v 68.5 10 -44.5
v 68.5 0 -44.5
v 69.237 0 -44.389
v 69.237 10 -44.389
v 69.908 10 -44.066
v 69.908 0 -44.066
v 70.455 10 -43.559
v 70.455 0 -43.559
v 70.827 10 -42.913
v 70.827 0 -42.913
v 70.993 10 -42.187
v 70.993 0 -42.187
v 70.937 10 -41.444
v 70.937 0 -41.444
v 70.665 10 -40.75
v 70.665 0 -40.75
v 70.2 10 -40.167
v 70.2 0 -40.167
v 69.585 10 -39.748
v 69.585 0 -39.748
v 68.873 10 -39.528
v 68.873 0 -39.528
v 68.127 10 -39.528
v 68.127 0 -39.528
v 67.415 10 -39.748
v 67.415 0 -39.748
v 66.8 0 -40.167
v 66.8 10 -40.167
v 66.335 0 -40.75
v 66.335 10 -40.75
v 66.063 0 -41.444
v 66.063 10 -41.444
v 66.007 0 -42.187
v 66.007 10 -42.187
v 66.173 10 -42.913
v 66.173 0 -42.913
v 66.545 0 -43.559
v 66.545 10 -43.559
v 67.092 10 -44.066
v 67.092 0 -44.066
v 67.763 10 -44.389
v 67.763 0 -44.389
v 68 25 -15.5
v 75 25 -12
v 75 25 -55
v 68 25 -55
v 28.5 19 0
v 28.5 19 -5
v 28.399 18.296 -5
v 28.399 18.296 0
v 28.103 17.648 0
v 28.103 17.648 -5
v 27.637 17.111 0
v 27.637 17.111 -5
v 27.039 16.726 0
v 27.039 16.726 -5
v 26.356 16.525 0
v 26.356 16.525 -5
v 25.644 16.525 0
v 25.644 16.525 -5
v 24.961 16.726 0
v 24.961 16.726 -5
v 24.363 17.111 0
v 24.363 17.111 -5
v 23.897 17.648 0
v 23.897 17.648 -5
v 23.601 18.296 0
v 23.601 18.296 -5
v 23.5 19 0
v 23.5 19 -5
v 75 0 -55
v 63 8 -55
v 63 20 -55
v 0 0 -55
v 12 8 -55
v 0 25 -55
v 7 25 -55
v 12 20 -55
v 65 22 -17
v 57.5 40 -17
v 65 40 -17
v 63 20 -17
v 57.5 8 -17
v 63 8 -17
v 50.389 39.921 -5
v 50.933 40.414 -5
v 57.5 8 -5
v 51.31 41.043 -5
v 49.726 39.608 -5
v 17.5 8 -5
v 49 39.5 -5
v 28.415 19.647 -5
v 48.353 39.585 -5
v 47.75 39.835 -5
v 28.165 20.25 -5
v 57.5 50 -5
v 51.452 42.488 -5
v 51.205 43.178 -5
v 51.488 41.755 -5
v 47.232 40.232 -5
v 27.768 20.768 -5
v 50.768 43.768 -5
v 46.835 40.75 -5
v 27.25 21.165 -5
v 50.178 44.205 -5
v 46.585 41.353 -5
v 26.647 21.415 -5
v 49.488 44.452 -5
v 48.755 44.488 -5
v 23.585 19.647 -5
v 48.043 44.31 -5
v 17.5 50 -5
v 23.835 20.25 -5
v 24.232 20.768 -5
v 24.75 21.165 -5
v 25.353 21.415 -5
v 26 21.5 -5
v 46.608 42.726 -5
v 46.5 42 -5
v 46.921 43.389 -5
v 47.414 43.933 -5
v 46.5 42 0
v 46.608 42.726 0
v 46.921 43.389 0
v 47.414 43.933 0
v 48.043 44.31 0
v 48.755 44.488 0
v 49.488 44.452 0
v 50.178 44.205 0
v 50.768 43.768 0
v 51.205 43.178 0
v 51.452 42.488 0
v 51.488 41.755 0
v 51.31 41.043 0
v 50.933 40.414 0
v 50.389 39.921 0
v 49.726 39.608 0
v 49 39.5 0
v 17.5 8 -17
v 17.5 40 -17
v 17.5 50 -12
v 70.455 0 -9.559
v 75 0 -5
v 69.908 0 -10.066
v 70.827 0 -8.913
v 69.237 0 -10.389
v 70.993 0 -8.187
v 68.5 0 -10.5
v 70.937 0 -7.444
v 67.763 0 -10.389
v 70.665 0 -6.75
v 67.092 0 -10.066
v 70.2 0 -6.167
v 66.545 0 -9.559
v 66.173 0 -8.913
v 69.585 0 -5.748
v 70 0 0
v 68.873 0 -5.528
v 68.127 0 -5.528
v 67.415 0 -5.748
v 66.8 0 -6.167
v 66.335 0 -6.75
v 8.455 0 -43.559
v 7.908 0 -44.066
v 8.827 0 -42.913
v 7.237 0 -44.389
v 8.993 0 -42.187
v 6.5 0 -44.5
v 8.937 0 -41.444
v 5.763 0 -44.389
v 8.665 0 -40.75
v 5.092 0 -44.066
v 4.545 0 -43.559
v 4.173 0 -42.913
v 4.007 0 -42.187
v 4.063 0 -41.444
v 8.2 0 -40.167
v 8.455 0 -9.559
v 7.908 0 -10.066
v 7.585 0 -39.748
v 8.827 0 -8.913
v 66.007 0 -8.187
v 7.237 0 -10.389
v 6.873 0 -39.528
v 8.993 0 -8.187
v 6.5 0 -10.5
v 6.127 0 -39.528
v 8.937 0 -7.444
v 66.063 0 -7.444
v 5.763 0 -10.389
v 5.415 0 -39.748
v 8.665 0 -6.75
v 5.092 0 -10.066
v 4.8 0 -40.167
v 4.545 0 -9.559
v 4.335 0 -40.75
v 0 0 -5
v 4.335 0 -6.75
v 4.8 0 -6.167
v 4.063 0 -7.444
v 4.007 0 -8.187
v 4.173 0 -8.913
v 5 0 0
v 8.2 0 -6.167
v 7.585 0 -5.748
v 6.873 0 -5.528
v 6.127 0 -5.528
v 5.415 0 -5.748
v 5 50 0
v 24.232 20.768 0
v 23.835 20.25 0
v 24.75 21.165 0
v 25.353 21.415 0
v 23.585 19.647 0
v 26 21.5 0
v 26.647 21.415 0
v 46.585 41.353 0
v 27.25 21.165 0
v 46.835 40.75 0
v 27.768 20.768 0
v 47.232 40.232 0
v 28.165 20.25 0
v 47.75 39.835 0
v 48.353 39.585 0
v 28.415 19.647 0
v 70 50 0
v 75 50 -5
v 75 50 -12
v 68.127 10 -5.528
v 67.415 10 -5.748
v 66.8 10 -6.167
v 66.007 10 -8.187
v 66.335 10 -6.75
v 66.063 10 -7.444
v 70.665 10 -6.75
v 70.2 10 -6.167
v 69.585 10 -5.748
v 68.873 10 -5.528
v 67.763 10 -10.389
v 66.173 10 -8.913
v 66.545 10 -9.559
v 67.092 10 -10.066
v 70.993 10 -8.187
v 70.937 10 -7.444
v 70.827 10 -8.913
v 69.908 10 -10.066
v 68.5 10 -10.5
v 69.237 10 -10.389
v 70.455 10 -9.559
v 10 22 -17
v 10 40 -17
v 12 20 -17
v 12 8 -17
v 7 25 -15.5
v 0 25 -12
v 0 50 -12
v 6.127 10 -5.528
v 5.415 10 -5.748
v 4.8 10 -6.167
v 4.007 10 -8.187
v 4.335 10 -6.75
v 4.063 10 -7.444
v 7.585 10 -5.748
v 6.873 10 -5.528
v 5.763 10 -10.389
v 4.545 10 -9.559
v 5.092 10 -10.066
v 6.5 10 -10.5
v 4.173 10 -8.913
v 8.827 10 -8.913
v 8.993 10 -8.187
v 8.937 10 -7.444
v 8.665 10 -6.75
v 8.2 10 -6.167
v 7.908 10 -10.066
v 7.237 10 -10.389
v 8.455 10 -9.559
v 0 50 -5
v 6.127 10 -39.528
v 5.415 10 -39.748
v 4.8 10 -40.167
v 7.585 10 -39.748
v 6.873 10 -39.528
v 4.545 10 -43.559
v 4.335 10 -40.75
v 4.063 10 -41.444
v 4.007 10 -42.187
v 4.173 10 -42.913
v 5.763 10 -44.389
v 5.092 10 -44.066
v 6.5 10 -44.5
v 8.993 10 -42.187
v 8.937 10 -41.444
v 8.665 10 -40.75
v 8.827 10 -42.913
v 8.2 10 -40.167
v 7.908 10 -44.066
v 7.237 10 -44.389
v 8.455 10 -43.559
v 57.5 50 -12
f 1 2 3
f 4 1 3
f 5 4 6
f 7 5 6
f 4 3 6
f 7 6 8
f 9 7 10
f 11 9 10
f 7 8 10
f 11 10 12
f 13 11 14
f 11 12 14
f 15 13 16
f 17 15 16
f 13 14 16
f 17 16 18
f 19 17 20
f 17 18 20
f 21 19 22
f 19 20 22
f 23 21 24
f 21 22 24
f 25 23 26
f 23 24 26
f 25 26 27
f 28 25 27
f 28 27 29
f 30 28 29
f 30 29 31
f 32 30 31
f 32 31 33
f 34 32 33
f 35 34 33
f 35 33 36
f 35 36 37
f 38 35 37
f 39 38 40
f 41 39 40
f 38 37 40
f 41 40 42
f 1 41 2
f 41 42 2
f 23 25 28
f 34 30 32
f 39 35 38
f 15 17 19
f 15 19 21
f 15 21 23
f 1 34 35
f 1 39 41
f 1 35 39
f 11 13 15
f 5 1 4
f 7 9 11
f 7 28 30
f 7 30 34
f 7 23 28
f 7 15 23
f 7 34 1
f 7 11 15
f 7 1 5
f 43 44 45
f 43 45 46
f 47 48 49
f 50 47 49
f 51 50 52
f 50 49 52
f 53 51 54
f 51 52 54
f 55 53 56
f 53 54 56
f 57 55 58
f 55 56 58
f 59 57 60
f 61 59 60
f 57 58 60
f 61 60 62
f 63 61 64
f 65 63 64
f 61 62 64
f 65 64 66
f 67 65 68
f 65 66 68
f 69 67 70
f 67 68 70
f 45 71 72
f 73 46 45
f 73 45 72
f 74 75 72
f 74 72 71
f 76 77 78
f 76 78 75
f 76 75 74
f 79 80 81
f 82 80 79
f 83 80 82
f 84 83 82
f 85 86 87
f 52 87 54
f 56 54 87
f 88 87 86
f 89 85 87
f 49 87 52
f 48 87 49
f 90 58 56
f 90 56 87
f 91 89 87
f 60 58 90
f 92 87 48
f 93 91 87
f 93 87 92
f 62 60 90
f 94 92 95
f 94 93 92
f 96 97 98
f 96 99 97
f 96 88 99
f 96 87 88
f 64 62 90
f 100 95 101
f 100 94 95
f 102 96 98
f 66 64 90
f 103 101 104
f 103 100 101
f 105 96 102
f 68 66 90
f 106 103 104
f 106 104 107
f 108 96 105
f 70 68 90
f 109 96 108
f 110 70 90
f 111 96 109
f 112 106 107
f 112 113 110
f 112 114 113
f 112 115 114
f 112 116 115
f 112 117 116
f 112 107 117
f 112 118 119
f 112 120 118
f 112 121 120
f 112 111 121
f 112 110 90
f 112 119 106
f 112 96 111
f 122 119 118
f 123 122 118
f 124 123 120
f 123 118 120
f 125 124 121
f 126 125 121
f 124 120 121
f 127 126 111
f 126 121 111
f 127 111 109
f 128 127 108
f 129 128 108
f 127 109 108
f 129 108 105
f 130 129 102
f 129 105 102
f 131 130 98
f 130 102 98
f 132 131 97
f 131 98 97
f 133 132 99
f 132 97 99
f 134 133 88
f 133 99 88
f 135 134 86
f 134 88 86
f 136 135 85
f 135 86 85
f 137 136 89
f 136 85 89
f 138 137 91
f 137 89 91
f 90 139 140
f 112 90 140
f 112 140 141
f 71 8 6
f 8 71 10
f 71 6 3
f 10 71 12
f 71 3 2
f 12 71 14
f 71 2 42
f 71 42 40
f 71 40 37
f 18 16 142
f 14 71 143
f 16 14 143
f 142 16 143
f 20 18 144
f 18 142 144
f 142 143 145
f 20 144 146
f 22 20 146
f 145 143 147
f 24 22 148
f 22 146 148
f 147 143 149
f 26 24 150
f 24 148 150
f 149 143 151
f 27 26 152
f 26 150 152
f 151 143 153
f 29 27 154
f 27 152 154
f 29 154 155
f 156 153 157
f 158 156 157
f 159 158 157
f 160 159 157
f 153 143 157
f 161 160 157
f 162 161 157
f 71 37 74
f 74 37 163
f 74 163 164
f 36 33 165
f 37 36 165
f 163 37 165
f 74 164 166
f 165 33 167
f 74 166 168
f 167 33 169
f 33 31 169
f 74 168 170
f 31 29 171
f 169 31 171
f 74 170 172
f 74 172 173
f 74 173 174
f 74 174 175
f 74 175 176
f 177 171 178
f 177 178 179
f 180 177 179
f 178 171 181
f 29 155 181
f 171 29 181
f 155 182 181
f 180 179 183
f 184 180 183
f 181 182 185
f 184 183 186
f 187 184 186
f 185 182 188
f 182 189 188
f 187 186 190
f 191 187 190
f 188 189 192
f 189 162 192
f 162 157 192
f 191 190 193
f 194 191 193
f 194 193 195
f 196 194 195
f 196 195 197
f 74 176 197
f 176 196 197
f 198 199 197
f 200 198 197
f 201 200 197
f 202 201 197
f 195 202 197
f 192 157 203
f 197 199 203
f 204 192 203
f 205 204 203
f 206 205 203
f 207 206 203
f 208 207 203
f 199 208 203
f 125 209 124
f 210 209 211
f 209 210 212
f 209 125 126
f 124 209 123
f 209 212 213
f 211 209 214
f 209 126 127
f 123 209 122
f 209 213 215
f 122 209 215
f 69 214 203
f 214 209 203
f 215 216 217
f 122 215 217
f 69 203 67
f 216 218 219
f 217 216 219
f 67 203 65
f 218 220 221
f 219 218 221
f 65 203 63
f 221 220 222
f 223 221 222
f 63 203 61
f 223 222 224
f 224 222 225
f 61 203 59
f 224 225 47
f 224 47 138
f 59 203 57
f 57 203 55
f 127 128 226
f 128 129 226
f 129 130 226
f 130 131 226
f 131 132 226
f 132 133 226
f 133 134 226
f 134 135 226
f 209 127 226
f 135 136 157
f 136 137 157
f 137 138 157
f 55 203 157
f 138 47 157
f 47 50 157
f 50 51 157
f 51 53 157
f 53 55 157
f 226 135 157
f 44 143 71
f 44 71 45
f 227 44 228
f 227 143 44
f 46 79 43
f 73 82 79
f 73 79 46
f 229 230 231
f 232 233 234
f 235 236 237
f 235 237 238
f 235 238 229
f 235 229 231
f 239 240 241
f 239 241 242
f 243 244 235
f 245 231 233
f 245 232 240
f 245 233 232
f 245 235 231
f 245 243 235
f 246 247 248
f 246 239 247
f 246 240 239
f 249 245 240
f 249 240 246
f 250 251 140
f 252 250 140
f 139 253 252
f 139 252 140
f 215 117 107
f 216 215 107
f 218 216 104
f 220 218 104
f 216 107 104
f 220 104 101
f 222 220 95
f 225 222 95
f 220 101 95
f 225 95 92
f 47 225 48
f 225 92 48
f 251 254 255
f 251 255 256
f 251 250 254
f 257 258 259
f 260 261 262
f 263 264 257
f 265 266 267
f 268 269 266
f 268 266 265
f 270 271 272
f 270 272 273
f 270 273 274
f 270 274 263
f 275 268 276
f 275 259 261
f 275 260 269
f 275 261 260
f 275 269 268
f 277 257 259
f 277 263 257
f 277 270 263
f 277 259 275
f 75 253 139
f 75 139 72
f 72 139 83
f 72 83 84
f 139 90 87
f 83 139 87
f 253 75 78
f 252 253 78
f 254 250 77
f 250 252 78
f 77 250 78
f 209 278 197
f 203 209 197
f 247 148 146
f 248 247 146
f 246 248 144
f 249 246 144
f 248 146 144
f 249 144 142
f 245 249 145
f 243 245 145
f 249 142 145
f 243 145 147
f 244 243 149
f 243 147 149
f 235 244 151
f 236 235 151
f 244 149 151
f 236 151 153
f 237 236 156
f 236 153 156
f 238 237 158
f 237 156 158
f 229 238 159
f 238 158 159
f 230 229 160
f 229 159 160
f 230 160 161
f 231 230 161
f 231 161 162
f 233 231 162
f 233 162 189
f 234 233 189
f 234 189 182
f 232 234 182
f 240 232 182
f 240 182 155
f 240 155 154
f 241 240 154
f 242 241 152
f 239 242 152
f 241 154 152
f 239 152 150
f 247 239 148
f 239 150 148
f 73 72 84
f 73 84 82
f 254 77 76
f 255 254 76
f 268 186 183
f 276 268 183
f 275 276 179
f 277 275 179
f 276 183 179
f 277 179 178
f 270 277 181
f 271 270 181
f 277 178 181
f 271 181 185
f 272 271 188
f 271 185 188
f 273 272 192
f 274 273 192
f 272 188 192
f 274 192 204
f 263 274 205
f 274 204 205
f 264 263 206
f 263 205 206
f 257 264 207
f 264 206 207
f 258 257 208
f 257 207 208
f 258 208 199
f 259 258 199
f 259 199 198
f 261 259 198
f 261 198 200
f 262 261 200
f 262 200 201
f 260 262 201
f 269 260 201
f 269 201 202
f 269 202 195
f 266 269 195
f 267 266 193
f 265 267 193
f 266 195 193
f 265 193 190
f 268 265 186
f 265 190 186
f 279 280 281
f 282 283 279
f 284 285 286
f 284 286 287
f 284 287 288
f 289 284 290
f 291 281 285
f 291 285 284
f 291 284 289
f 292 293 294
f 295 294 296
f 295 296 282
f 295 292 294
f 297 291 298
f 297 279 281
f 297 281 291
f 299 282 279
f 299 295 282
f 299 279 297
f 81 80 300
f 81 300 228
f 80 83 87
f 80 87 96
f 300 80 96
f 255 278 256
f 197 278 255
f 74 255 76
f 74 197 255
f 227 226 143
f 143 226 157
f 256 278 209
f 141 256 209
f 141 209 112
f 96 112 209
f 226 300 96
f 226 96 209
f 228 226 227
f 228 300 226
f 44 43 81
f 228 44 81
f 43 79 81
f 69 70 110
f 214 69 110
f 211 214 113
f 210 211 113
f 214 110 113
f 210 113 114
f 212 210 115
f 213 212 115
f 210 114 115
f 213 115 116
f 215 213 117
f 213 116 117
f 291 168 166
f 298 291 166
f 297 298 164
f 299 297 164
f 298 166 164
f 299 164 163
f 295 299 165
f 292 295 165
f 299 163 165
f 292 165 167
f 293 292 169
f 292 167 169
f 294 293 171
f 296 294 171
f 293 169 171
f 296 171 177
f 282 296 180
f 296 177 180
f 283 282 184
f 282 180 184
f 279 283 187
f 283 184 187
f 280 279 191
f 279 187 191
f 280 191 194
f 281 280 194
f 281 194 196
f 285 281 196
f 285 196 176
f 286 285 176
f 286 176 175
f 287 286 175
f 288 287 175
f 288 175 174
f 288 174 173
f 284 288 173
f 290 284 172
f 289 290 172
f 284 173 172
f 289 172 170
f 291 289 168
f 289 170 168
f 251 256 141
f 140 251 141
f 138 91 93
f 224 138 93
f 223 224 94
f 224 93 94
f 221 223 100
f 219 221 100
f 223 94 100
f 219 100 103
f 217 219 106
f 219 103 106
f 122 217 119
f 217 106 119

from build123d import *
from OCP.BRepFilletAPI import BRepFilletAPI_MakeChamfer

# Parameters (mm, degrees)
SKETCH1_W           = 75
SKETCH1_H           = 17
BOSS_EXTRUDE1_DEPTH = 50
SKETCH2_W           = 12
SKETCH2_H           = 25
BOSS_EXTRUDE2_DEPTH = 38
SKETCH3_W           = 75
SKETCH3_H           = 55
BOSS_EXTRUDE3_DEPTH = 8
SKETCH4_R           = 2.5
CUT_EXTRUDE1_DEPTH  = 10
SKETCH5_W           = 40
SKETCH5_H           = 42
CUT_EXTRUDE2_DEPTH  = 12
CUT_EXTRUDE3_DEPTH  = 104.07764064
CHAMFER1_SIZE       = 5
CHAMFER3_SIZE       = 5
CHAMFER3_SIZE_2     = 10
CHAMFER4_SIZE       = 5
CHAMFER4_SIZE2      = 10


with BuildPart() as part:
    # Sketch1 → Boss-Extrude1 (new body)
    with BuildSketch(Plane(origin=(0, 0, 0), x_dir=(1, 0, 0), z_dir=(0, 1, 0))):
        with Locations((37.5, 8.5)):
            Rectangle(SKETCH1_W, SKETCH1_H)
    extrude(amount=BOSS_EXTRUDE1_DEPTH)

    # Sketch2 → Boss-Extrude2 (add)
    with BuildSketch(Plane(origin=(0, 0, -17), x_dir=(-1, 0, 0), z_dir=(0, 0, -1))):
        with Locations((-69, 12.5)):
            Rectangle(SKETCH2_W, SKETCH2_H)
        with Locations((-6, 12.5)):
            Rectangle(SKETCH2_W, SKETCH2_H)
    extrude(amount=BOSS_EXTRUDE2_DEPTH)

    # Sketch3 → Boss-Extrude3 (add)
    with BuildSketch(Plane.XZ):
        with Locations((37.5, -27.5)):
            Rectangle(SKETCH3_W, SKETCH3_H)
    extrude(amount=-BOSS_EXTRUDE3_DEPTH)

    # Sketch4 → Cut-Extrude1 (cut)
    with BuildSketch(Plane(origin=(0, 0, 0), x_dir=(-1, 0, 0), z_dir=(0, -1, 0))):
        with Locations(Location((-6.5, 8, 0), (0, 0, 90))):
            Circle(SKETCH4_R)
        with Locations(Location((-68.5, 8, 0), (0, 0, 90))):
            Circle(SKETCH4_R)
        with Locations(Location((-6.5, 42, 0), (0, 0, 90))):
            Circle(SKETCH4_R)
        with Locations(Location((-68.5, 42, 0), (0, 0, 90))):
            Circle(SKETCH4_R)
    extrude(amount=-CUT_EXTRUDE1_DEPTH, mode=Mode.SUBTRACT)

    # Sketch5 → Cut-Extrude2 (cut)
    with BuildSketch(Plane(origin=(0, 0, -17), x_dir=(-1, 0, 0), z_dir=(0, 0, -1))):
        with Locations((-37.5, 29)):
            Rectangle(SKETCH5_W, SKETCH5_H)
    extrude(amount=-CUT_EXTRUDE2_DEPTH, mode=Mode.SUBTRACT)

    # Sketch6 → Cut-Extrude3 (cut, through all)
    with BuildSketch(Plane(origin=(0, 0, -5), x_dir=(-1, 0, 0), z_dir=(0, 0, -1))):
        with BuildLine():
            Line((-49, 39.5), (-49, 42))
            Line((-49, 42), (-46.5, 42))
            ThreePointArc((-46.5, 42), (-50.767766953, 43.767766953), (-49, 39.5))
        make_face()
        with BuildLine():
            Line((-46.5, 42), (-49, 42))
            Line((-49, 42), (-49, 39.5))
            ThreePointArc((-49, 39.5), (-47.232233047, 40.232233047), (-46.5, 42))
        make_face()
        with BuildLine():
            ThreePointArc((-23.5, 19), (-24.232233047, 20.767766953), (-26, 21.5))
            Line((-26, 21.5), (-26, 19))
            Line((-26, 19), (-28.5, 19))
            ThreePointArc((-28.5, 19), (-26, 16.5), (-23.5, 19))
        make_face()
        with BuildLine():
            Line((-26, 19), (-26, 21.5))
            ThreePointArc((-26, 21.5), (-27.767766953, 20.767766953), (-28.5, 19))
            Line((-28.5, 19), (-26, 19))
        make_face()
    extrude(amount=-CUT_EXTRUDE3_DEPTH, mode=Mode.SUBTRACT)

    # Chamfer1
    chamfer1_edges = [part.edges().sort_by_distance(p)[0] for p in [
        (63, 25, -36),
        (12, 25, -36),
        (75, 25, 0),
        (0, 25, 0),
    ]]
    chamfer(chamfer1_edges, length=CHAMFER1_SIZE)

    # Chamfer3
    chamfer3_edges_1 = [part.edges().sort_by_distance(p)[0] for p in [
        (0, 37.5, -17),
    ]]
    chamfer3_side_1 = [part.faces().sort_by_distance(p)[0] for p in [
        (0, 37.5, -16.9),
    ]]
    chamfer3_edges_2 = [part.edges().sort_by_distance(p)[0] for p in [
        (8.75, 50, -17),
    ]]
    chamfer3_side_2 = [part.faces().sort_by_distance(p)[0] for p in [
        (8.75, 50, -16.9),
    ]]
    chamfer3 = BRepFilletAPI_MakeChamfer(part.part.solid().wrapped)
    for e in chamfer3_edges_1:
        chamfer3.Add(CHAMFER3_SIZE - 0.0001, CHAMFER3_SIZE_2 - 0.0001, e.wrapped, chamfer3_side_1[0].wrapped)
    for e in chamfer3_edges_2:
        chamfer3.Add(CHAMFER3_SIZE - 0.0001, CHAMFER3_SIZE_2 - 0.0001, e.wrapped, chamfer3_side_2[0].wrapped)
    add(Compound.cast(chamfer3.Shape()), mode=Mode.REPLACE)  # a hair under: the kernel refuses the full size

    # Chamfer4: one chamfer whose edges measure the first distance from different faces: ONE call of the kernel's chamfer builder (chamfer() names one face for all edges)
    chamfer4_edges_1 = [part.edges().sort_by_distance(p)[0] for p in [
        (66.25, 50, -17),
    ]]
    chamfer4_side_1 = [part.faces().sort_by_distance(p)[0] for p in [
        (0.769025357, 50, -8.50005),
    ]]
    chamfer4_edges_2 = [part.edges().sort_by_distance(p)[0] for p in [
        (75, 37.5, -17),
    ]]
    chamfer4_side_2 = [part.faces().sort_by_distance(p)[0] for p in [
        (75, 17.338709677, -26.322580645),
    ]]
    chamfer4 = BRepFilletAPI_MakeChamfer(part.part.solid().wrapped)
    for e in chamfer4_edges_1:
        chamfer4.Add(CHAMFER4_SIZE, CHAMFER4_SIZE2, e.wrapped, chamfer4_side_1[0].wrapped)  # the first distance lies on this face
    for e in chamfer4_edges_2:
        chamfer4.Add(CHAMFER4_SIZE, CHAMFER4_SIZE2, e.wrapped, chamfer4_side_2[0].wrapped)  # the first distance lies on this face
    add(Compound.cast(chamfer4.Shape()), mode=Mode.REPLACE)


solid = part.part
